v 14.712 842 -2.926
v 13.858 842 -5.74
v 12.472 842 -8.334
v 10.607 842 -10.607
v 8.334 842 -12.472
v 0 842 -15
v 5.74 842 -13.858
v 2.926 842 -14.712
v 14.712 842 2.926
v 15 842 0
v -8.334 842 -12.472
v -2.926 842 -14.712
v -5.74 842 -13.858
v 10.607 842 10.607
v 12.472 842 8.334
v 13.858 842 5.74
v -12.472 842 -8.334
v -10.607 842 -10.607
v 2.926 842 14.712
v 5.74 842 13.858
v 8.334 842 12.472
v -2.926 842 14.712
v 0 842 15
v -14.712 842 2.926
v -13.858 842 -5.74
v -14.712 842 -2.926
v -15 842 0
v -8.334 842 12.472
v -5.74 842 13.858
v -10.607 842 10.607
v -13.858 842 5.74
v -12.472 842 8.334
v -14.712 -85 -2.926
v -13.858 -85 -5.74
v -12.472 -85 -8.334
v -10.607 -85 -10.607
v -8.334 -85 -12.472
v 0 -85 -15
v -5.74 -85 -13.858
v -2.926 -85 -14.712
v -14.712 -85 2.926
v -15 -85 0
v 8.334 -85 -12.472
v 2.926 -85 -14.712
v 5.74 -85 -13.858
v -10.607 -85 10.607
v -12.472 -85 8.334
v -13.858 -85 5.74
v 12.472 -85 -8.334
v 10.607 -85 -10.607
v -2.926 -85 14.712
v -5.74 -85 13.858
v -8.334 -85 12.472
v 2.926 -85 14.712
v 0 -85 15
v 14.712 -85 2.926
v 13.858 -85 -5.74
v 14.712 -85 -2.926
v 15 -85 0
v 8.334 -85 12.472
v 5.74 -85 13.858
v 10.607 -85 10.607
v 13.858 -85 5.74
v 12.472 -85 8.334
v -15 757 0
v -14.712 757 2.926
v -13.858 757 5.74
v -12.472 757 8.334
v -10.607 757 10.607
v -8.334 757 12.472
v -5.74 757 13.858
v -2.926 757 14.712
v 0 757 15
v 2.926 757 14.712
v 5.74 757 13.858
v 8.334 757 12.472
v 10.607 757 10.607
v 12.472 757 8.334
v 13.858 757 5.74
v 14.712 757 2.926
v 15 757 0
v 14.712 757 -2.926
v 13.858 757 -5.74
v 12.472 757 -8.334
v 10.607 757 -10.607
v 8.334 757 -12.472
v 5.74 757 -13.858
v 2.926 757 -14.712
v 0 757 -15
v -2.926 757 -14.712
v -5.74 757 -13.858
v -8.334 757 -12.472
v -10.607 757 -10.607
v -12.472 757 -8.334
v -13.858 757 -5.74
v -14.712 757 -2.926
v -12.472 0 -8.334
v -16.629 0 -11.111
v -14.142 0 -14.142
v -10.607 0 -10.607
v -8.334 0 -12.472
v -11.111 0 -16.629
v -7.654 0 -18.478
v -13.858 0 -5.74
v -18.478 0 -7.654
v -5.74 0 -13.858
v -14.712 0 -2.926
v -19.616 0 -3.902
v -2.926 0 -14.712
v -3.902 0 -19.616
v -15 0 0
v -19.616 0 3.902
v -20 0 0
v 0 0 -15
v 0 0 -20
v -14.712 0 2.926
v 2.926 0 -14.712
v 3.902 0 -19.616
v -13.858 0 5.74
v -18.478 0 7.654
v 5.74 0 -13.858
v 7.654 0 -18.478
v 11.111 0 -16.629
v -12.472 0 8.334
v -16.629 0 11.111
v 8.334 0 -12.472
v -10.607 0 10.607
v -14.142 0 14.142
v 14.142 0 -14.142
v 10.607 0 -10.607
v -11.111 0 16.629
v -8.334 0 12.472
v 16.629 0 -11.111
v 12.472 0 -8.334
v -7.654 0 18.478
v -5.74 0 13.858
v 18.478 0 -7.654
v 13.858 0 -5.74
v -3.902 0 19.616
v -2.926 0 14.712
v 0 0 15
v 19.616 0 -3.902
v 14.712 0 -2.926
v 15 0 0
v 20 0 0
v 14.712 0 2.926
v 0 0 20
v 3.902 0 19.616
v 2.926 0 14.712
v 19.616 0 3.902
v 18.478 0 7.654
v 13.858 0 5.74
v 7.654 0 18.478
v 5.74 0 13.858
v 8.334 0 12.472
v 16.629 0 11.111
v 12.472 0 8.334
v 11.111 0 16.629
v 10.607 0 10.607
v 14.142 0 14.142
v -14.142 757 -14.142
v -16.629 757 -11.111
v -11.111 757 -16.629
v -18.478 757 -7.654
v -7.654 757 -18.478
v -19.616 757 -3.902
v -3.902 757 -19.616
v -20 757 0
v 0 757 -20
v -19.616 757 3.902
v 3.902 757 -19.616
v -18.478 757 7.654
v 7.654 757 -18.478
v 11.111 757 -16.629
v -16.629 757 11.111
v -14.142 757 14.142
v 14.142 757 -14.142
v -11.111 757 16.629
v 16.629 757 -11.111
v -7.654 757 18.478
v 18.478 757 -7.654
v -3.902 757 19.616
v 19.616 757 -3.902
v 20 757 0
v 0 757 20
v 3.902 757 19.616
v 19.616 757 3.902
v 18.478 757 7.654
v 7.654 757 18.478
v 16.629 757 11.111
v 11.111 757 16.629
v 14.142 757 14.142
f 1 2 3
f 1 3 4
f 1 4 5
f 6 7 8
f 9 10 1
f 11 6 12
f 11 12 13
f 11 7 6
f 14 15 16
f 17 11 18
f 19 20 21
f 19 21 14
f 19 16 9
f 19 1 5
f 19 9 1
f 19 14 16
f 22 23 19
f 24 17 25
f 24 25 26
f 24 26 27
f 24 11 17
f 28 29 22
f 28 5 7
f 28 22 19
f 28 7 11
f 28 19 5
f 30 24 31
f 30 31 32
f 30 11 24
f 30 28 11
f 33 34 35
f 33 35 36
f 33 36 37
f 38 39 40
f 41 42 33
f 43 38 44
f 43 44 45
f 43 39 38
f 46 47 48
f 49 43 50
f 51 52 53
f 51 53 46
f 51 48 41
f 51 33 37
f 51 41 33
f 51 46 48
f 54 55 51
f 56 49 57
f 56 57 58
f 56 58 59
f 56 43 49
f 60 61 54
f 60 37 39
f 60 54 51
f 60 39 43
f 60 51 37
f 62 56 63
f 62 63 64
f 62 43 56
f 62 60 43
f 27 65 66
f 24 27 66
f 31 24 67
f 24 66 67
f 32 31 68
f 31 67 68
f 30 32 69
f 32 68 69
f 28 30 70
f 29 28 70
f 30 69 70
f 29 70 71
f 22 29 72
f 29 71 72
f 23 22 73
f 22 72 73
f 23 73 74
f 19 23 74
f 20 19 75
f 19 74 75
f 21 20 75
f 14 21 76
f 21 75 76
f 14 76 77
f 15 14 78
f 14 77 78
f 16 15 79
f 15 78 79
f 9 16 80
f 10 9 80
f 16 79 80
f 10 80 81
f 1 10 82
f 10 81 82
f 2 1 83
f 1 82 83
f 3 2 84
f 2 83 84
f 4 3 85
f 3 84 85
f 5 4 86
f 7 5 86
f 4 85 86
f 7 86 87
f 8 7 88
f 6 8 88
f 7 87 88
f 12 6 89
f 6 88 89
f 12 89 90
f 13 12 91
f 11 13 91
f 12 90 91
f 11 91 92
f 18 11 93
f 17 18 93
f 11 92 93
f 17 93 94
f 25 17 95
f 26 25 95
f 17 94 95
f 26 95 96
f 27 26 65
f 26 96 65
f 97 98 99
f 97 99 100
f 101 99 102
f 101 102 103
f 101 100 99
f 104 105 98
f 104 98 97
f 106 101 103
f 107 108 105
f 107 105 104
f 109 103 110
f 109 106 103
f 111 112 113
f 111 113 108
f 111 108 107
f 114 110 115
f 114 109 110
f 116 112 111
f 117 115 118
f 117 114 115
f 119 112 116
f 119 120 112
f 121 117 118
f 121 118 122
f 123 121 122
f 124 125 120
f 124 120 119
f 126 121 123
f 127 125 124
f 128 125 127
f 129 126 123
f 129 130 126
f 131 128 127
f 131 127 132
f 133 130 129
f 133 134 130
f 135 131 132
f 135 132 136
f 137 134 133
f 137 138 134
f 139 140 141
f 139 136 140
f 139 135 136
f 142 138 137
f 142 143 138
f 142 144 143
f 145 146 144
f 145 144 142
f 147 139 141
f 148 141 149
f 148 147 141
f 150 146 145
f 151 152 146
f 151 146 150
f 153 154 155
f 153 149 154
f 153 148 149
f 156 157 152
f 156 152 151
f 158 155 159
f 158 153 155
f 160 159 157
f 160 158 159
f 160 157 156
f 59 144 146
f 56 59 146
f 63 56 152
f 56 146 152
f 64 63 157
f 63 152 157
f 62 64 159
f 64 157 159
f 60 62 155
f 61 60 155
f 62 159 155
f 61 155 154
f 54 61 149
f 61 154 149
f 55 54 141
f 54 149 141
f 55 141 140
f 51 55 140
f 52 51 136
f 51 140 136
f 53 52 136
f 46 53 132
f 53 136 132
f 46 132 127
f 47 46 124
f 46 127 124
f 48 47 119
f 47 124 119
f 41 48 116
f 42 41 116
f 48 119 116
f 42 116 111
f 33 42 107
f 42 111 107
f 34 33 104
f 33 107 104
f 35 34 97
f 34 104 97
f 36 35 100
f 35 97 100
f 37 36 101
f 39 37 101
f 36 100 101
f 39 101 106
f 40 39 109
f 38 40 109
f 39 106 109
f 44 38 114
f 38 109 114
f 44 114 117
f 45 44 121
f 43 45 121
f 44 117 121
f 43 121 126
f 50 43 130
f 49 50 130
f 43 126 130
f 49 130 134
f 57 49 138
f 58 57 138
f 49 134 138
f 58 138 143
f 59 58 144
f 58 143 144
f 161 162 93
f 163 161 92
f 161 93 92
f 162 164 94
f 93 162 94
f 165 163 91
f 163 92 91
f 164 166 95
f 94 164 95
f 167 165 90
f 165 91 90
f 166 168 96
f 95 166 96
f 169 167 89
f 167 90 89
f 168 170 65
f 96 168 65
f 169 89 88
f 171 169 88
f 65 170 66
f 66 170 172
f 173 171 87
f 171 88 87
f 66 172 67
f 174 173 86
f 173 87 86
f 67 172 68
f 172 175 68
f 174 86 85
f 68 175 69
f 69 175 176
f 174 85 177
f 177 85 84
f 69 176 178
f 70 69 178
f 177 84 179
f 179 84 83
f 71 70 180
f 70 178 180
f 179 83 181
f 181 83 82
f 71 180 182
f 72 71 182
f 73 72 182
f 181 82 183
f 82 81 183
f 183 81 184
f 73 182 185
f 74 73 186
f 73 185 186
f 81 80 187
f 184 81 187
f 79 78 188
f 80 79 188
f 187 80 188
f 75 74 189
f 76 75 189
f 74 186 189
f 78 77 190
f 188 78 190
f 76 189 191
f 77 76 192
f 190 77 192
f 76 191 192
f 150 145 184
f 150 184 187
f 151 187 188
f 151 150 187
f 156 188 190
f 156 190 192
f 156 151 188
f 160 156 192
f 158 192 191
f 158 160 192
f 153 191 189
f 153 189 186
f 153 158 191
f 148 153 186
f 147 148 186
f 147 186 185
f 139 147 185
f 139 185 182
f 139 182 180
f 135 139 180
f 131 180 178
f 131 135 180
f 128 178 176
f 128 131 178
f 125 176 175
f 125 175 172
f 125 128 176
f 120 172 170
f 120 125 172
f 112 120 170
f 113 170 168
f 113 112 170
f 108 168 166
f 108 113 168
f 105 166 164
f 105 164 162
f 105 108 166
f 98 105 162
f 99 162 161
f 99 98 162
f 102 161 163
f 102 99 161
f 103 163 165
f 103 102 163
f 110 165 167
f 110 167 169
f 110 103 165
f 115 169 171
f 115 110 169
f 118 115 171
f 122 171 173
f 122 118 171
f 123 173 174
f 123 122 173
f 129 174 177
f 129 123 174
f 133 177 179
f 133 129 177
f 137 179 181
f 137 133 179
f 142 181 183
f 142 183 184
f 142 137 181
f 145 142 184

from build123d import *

# Parameters (mm, degrees)
F0_R     = 20
F1_DEPTH = 757
F2_R     = 15
F4_DEPTH = 85
F3_R     = 15
F5_DEPTH = 85


with BuildPart() as f1:
    # F0 (on Front) → F1 (new body)
    with BuildSketch(Plane.XZ):
        Circle(F0_R)
    extrude(amount=-F1_DEPTH)

    # F2 (on face) → F4 (join)
    with BuildSketch(Plane.XZ):
        Circle(F2_R)
    extrude(amount=F4_DEPTH)

    # F3 (on face) → F5 (join)
    with BuildSketch(Plane(origin=(0, 757, 0), x_dir=(-1, 0, 0), z_dir=(0, 1, 0))):
        Circle(F3_R)
    extrude(amount=F5_DEPTH)


solid = f1.part
